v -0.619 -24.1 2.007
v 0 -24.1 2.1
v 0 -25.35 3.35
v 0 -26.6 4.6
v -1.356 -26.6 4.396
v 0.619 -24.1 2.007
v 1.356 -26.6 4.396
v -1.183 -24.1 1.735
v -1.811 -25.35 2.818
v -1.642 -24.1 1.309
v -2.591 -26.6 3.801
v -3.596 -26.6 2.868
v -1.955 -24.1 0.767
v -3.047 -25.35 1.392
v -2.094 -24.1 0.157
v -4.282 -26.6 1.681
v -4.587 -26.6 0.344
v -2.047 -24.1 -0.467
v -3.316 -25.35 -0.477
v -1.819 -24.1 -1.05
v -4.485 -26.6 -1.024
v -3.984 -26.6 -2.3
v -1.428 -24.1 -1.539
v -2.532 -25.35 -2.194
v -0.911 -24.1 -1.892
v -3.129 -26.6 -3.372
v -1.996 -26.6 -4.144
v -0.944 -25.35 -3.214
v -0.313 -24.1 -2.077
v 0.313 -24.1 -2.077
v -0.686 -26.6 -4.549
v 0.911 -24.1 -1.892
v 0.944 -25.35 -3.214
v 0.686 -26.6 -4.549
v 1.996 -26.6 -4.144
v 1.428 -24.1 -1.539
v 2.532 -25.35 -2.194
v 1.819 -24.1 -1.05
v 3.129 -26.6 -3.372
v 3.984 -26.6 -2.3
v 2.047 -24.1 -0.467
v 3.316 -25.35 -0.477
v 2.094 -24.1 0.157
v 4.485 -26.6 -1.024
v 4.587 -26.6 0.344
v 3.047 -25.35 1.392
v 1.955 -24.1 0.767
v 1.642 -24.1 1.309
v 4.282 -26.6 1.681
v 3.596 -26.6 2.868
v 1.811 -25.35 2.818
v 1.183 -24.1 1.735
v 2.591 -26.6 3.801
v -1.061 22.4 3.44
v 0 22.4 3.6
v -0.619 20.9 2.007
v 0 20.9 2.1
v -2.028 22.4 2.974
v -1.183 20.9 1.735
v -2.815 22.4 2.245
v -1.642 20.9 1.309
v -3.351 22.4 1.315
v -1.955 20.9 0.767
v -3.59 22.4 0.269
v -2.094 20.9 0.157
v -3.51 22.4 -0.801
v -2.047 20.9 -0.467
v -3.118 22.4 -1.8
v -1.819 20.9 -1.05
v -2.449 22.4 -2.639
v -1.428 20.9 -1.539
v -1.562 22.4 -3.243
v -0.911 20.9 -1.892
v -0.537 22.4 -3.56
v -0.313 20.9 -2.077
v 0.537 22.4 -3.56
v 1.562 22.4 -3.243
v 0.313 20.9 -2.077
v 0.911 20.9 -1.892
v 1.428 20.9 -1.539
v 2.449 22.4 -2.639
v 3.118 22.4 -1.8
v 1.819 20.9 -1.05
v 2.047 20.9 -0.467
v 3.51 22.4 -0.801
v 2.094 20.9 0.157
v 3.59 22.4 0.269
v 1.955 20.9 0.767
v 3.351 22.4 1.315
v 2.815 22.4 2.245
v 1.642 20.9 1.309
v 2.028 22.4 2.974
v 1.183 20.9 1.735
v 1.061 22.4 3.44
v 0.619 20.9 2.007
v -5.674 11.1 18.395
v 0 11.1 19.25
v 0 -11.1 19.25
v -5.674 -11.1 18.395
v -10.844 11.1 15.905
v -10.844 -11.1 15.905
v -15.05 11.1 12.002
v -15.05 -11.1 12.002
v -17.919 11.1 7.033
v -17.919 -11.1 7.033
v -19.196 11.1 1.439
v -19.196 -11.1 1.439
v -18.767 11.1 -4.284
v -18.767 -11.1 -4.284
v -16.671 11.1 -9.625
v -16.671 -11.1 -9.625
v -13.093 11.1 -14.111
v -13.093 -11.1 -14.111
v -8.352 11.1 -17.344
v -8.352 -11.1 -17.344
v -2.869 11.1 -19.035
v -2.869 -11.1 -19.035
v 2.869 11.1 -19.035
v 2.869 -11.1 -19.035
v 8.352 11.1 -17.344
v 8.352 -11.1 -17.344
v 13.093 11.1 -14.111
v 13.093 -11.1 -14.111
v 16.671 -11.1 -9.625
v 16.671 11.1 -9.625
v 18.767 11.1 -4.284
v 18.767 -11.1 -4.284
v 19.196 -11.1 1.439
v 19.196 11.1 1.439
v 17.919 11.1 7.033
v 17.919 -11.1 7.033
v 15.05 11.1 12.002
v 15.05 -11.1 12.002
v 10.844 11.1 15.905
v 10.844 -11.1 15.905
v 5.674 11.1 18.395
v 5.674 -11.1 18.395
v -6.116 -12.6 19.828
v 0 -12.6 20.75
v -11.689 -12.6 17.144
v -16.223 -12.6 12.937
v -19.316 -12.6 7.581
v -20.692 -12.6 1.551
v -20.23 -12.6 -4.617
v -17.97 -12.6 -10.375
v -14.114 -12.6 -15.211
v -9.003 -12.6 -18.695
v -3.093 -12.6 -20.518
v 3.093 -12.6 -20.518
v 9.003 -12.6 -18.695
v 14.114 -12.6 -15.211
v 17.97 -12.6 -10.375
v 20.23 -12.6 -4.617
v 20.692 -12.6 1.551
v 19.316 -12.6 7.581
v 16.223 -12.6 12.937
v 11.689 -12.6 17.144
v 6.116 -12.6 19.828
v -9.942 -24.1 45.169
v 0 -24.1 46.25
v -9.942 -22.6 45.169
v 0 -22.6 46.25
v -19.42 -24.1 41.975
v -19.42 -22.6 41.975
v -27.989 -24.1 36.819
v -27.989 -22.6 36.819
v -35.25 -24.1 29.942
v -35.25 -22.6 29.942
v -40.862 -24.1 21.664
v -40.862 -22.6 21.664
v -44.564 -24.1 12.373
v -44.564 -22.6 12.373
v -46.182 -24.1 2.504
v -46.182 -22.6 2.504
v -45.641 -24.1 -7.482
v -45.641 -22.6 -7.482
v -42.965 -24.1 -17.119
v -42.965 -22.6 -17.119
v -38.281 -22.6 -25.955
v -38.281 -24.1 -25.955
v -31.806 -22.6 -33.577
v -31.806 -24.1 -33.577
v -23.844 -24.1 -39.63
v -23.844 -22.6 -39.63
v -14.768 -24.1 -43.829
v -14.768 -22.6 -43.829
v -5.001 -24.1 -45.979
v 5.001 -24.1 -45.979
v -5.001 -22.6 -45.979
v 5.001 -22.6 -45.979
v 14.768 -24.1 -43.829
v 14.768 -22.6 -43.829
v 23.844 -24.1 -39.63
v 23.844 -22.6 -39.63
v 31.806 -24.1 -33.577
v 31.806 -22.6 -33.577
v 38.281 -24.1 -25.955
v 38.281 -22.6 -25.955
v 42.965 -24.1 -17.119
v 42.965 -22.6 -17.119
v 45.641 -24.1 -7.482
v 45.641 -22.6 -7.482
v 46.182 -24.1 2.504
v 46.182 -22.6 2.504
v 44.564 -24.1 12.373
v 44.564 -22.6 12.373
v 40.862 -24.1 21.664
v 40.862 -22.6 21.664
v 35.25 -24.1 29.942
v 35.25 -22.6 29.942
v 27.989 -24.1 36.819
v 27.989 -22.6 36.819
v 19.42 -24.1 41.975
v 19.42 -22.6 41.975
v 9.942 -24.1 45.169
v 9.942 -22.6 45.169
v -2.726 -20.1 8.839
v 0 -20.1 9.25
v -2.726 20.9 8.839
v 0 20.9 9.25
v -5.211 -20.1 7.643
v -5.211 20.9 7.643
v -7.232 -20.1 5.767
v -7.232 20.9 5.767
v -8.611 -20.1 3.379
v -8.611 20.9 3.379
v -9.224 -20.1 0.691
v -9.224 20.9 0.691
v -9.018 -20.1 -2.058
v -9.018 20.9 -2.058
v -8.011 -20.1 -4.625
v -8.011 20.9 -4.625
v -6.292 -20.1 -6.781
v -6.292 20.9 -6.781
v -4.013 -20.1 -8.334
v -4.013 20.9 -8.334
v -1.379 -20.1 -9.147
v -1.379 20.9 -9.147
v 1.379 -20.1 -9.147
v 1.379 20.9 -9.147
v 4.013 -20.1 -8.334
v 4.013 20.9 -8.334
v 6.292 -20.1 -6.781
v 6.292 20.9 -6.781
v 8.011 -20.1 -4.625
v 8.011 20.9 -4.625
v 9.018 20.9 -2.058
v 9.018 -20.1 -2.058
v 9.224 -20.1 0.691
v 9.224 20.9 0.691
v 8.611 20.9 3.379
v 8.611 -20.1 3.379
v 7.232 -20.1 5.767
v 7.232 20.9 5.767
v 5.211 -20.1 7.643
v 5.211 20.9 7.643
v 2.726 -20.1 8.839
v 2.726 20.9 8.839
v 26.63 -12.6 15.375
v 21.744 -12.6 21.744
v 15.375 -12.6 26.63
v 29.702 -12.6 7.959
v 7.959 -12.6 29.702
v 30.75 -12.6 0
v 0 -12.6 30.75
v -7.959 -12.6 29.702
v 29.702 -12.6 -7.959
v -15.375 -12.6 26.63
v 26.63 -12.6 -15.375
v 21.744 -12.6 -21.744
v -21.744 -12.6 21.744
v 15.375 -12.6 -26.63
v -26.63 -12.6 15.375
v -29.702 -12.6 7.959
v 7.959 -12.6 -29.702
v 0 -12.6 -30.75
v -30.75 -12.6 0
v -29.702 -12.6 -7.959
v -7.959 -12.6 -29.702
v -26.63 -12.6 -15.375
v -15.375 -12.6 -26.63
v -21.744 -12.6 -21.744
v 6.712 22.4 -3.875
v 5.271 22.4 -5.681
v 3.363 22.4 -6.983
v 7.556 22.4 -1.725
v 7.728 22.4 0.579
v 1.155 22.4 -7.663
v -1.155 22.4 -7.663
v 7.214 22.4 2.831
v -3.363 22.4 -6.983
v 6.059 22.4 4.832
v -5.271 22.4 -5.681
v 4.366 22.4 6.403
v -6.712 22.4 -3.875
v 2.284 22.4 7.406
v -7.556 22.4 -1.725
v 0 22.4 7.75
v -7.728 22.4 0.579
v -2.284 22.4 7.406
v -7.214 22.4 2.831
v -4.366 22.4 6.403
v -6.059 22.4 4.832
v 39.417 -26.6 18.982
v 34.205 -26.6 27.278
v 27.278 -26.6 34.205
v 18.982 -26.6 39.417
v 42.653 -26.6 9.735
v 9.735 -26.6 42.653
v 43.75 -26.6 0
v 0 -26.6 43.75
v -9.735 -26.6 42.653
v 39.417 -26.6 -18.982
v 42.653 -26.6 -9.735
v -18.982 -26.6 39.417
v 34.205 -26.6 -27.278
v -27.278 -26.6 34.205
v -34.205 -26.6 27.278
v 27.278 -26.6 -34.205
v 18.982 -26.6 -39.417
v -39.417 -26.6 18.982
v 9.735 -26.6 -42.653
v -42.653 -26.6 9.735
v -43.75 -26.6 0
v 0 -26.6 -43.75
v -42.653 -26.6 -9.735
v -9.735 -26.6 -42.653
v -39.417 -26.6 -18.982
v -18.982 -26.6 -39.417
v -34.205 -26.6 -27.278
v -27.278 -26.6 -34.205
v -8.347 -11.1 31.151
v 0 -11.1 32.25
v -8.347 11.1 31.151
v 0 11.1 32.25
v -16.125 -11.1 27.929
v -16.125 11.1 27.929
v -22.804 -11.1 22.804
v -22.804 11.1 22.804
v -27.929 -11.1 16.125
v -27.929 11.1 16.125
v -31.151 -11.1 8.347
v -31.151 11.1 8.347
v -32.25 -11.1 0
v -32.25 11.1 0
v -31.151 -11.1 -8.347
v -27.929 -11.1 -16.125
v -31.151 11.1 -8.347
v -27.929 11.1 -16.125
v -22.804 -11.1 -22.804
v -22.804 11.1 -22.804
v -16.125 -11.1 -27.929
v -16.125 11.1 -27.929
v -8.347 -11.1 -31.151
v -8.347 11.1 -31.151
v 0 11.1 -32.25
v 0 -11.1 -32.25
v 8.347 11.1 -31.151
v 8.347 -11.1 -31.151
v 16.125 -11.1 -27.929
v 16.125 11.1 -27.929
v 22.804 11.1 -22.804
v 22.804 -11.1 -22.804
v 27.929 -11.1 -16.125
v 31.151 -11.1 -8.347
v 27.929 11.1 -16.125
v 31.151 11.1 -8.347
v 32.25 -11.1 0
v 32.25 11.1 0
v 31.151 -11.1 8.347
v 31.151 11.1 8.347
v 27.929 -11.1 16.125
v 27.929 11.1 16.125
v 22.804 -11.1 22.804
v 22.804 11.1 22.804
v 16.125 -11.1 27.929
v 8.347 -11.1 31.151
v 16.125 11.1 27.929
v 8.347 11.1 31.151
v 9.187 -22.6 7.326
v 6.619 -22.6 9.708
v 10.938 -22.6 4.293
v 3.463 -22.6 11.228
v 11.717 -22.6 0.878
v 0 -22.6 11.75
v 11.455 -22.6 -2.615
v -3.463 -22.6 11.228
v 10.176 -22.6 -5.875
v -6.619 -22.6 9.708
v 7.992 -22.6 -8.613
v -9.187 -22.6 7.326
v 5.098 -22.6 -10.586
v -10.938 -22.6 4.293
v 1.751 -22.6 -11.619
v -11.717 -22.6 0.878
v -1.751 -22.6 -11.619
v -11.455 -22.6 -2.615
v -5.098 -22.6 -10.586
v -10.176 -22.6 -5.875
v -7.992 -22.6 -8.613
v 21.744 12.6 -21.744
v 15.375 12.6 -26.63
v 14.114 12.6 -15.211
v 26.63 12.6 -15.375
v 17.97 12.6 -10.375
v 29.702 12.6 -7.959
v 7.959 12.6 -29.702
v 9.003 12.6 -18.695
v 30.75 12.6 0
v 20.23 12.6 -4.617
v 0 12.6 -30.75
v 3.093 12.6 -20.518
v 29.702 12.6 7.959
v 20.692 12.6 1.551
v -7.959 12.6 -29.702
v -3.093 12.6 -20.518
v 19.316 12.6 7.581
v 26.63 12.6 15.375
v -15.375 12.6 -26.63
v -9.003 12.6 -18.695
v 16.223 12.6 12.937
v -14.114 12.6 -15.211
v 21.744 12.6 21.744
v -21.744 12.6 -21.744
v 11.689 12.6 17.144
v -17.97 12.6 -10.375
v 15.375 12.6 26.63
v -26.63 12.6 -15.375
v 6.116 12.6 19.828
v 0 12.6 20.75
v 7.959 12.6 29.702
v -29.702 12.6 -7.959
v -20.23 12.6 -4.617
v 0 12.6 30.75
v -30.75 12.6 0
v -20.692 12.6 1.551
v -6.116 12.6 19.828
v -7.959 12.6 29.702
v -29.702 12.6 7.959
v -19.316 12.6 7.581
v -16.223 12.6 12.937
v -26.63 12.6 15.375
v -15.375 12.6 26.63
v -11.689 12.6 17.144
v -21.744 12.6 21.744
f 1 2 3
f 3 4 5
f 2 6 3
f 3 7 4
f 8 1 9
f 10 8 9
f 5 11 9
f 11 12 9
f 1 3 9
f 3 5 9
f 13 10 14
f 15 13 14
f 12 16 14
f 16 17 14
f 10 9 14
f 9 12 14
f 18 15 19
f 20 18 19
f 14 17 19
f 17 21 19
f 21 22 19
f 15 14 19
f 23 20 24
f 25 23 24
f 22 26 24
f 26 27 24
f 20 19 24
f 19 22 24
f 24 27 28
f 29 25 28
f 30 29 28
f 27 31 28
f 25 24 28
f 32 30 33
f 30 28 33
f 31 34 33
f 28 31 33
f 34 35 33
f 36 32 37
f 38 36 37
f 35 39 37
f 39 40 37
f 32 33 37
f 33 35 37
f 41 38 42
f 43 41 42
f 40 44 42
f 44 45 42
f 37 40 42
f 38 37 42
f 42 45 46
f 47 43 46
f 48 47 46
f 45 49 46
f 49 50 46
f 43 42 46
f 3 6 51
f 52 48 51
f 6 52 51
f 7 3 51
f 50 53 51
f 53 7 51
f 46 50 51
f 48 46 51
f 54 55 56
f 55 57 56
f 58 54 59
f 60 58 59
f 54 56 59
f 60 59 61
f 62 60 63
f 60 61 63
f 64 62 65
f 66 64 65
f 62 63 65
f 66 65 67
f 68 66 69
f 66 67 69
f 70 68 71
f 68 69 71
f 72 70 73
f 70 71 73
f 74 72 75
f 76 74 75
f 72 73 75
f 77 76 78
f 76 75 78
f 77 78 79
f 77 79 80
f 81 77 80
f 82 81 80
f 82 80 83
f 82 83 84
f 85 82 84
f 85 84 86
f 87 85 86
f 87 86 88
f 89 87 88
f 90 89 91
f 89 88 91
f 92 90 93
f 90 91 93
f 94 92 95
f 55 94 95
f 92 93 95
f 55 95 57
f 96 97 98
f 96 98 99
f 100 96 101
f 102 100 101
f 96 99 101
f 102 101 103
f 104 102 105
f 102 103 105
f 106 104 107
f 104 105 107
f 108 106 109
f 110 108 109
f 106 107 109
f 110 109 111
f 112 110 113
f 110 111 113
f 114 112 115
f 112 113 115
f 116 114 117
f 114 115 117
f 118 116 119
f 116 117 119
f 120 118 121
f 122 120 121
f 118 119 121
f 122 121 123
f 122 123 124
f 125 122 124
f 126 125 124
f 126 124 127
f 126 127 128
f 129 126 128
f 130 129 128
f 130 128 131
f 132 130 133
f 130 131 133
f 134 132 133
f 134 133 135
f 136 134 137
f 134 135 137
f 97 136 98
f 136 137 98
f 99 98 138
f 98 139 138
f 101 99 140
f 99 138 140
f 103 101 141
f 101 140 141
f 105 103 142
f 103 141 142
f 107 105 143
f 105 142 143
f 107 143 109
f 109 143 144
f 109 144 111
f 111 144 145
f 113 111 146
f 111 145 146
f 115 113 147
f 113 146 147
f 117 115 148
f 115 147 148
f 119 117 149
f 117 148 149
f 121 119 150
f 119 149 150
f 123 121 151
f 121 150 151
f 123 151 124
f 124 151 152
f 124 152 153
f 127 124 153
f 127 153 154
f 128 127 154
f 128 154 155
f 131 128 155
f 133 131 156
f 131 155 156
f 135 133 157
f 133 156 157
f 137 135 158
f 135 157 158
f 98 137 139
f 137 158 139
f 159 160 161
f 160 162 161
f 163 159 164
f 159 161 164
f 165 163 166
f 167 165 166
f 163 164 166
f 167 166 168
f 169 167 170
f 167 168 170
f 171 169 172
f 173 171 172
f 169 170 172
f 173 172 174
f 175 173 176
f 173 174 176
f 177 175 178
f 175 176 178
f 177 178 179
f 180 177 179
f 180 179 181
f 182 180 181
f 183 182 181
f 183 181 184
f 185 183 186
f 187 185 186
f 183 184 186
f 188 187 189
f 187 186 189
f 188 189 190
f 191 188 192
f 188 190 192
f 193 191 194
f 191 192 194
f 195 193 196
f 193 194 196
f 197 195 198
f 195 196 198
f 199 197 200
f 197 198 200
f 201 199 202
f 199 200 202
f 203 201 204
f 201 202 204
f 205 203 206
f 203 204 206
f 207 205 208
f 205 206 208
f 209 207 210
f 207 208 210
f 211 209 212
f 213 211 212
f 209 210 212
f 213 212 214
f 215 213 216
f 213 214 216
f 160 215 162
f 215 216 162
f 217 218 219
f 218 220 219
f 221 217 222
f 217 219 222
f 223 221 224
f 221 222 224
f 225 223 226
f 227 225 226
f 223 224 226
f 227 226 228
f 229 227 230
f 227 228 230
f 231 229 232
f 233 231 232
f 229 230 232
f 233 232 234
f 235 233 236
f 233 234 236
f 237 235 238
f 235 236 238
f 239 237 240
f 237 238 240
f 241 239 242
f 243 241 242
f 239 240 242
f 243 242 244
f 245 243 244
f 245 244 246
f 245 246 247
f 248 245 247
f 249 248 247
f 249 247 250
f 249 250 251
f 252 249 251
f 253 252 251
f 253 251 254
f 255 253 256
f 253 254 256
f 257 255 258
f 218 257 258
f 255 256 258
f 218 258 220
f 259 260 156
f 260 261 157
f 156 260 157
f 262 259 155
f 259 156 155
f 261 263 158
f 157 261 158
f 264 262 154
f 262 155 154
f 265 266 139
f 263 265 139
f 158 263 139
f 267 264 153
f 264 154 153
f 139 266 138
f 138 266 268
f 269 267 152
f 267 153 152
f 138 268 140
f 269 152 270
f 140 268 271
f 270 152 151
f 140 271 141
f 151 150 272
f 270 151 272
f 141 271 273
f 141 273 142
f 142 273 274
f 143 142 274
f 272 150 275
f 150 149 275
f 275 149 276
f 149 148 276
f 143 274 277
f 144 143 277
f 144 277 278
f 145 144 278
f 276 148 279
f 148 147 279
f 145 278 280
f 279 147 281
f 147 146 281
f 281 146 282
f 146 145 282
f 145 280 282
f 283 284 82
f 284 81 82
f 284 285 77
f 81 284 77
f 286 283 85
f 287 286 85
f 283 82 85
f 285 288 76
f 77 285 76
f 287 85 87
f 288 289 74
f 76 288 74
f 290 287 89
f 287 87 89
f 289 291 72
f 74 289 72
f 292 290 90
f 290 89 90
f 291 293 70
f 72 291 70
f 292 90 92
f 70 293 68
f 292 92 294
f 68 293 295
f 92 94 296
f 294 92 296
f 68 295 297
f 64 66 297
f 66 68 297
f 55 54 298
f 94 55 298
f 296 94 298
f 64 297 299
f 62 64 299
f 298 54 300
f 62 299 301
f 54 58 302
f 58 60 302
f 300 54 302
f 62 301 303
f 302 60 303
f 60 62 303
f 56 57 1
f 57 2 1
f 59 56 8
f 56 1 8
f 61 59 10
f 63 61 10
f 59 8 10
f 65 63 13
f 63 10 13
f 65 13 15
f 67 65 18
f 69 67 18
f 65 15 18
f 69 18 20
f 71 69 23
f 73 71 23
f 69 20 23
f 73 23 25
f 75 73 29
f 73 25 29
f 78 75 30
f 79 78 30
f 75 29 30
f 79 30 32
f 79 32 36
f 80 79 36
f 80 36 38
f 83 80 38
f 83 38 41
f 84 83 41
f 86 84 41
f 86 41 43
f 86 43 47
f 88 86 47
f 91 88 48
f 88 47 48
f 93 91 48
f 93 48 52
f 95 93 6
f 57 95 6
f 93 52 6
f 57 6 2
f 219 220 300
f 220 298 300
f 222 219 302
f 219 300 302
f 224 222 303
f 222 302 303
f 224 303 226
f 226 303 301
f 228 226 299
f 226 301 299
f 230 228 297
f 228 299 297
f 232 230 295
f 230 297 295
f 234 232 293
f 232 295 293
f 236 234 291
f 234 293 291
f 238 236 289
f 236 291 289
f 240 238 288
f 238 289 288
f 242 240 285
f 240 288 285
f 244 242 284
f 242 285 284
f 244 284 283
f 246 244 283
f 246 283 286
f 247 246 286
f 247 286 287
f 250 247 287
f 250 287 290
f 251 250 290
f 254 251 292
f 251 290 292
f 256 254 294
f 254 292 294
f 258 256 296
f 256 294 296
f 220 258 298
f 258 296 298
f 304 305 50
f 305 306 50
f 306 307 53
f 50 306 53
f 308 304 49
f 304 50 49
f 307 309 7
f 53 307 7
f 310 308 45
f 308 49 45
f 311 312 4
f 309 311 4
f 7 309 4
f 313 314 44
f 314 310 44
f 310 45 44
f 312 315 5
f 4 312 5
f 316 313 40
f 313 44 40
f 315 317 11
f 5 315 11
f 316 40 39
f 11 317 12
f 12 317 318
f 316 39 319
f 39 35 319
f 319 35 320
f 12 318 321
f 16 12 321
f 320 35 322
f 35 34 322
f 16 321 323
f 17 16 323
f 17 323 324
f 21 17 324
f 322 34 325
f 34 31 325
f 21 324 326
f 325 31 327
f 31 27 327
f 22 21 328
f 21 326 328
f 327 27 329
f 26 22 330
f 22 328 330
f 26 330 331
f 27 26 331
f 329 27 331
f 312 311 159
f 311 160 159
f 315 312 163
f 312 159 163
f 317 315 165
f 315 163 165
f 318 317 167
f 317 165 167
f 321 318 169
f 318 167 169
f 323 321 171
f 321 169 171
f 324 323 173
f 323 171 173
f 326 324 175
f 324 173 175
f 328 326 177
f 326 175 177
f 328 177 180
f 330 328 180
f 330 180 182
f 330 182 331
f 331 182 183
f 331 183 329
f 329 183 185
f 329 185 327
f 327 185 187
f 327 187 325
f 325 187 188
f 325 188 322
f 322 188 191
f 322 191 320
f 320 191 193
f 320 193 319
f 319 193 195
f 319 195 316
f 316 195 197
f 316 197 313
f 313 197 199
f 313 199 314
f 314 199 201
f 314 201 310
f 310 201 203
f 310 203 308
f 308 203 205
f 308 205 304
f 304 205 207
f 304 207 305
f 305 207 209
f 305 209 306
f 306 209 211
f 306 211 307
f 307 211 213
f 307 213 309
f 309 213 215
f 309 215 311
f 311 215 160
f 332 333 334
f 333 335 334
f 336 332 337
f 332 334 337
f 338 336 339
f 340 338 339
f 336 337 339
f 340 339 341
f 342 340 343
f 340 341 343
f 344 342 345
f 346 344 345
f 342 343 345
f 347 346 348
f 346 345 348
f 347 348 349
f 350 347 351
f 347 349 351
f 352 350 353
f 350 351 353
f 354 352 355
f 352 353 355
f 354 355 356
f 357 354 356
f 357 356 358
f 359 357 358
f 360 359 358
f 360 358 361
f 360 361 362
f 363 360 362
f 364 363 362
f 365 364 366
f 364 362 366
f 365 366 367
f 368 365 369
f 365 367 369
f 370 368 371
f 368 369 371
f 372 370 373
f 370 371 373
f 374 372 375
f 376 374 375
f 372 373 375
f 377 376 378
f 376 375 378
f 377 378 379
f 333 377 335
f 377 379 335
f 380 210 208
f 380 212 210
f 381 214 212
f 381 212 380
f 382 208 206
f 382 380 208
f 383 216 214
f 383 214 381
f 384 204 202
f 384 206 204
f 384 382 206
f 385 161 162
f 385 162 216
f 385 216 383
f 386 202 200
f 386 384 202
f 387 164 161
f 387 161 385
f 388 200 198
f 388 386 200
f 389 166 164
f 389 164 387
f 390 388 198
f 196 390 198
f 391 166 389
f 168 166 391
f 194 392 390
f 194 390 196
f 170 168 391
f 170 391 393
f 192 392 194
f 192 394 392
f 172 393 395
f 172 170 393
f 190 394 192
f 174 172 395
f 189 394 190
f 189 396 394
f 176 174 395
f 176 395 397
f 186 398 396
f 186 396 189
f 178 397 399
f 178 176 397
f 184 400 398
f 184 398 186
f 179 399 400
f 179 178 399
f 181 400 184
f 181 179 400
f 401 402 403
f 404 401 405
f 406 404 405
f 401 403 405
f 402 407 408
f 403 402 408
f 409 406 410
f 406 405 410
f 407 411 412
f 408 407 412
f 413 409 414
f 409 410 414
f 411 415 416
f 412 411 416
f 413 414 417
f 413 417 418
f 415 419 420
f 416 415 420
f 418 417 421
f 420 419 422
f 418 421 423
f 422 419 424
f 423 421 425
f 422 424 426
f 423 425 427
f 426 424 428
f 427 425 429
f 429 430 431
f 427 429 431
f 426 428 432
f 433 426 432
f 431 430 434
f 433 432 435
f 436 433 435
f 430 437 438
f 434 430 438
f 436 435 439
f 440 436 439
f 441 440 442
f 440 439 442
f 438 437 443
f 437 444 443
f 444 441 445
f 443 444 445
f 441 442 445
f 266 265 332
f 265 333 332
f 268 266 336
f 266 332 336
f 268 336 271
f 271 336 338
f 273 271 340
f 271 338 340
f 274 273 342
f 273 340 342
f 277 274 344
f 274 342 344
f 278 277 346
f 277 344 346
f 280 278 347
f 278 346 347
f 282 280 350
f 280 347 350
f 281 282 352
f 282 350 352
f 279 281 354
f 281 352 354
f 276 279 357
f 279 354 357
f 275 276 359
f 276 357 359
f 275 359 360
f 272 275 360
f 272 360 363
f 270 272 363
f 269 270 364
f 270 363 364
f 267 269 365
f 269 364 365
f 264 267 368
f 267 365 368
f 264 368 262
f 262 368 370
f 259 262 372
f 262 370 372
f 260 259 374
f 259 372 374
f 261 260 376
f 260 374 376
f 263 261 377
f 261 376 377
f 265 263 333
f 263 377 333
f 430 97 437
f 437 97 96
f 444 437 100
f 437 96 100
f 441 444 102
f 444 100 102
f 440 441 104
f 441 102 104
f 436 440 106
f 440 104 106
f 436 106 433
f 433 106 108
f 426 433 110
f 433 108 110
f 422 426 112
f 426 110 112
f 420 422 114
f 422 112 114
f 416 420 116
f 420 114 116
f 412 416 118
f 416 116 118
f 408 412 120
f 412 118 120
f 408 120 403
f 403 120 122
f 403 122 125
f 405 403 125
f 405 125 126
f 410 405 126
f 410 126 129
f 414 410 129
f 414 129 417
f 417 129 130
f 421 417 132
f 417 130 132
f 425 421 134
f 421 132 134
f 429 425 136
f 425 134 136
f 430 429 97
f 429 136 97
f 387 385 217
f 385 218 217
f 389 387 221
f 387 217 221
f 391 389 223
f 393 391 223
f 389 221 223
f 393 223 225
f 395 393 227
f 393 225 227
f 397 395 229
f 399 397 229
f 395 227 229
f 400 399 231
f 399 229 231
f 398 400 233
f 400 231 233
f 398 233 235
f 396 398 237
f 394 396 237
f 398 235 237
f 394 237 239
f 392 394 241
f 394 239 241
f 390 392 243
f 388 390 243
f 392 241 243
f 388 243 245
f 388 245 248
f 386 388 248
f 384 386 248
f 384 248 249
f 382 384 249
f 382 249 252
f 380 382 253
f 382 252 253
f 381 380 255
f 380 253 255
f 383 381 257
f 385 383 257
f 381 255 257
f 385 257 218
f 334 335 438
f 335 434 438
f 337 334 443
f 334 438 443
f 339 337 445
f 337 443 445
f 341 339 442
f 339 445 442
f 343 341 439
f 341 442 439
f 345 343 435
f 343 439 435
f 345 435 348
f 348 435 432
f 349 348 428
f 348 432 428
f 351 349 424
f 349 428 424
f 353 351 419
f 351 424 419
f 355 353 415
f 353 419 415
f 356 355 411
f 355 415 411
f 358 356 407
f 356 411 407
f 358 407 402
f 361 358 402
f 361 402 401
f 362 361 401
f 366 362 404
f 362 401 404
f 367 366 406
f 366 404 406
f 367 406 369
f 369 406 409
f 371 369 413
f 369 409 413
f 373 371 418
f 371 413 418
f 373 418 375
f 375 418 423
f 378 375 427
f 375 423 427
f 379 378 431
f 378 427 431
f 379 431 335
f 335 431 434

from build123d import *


with BuildPart() as part:
    # Sketch2 → Revolve1 (revolve)
    with BuildSketch(Plane(origin=(0, 0, 0), x_dir=(0, 0, -1), z_dir=(1, 0, 0))):
        Polygon((-32.25, 11.1), (-30.75, 12.6), (-20.75, 12.6), (-19.25, 11.1), (-19.25, -11.1), (-20.75, -12.6), (-30.75, -12.6), (-32.25, -11.1), align=None)
        Polygon((-39.75, -22.6), (-11.75, -22.6), (-9.25, -20.1), (-9.25, 20.9), (-7.75, 22.4), (-3.6, 22.4), (-2.1, 20.9), (-2.1, -24.1), (-4.6, -26.6), (-43.75, -26.6), (-46.25, -24.1), (-46.25, -22.6), align=None)
    revolve(axis=Axis((0, 44.566477302, 0), (0, -1, 0)))


solid = part.part
